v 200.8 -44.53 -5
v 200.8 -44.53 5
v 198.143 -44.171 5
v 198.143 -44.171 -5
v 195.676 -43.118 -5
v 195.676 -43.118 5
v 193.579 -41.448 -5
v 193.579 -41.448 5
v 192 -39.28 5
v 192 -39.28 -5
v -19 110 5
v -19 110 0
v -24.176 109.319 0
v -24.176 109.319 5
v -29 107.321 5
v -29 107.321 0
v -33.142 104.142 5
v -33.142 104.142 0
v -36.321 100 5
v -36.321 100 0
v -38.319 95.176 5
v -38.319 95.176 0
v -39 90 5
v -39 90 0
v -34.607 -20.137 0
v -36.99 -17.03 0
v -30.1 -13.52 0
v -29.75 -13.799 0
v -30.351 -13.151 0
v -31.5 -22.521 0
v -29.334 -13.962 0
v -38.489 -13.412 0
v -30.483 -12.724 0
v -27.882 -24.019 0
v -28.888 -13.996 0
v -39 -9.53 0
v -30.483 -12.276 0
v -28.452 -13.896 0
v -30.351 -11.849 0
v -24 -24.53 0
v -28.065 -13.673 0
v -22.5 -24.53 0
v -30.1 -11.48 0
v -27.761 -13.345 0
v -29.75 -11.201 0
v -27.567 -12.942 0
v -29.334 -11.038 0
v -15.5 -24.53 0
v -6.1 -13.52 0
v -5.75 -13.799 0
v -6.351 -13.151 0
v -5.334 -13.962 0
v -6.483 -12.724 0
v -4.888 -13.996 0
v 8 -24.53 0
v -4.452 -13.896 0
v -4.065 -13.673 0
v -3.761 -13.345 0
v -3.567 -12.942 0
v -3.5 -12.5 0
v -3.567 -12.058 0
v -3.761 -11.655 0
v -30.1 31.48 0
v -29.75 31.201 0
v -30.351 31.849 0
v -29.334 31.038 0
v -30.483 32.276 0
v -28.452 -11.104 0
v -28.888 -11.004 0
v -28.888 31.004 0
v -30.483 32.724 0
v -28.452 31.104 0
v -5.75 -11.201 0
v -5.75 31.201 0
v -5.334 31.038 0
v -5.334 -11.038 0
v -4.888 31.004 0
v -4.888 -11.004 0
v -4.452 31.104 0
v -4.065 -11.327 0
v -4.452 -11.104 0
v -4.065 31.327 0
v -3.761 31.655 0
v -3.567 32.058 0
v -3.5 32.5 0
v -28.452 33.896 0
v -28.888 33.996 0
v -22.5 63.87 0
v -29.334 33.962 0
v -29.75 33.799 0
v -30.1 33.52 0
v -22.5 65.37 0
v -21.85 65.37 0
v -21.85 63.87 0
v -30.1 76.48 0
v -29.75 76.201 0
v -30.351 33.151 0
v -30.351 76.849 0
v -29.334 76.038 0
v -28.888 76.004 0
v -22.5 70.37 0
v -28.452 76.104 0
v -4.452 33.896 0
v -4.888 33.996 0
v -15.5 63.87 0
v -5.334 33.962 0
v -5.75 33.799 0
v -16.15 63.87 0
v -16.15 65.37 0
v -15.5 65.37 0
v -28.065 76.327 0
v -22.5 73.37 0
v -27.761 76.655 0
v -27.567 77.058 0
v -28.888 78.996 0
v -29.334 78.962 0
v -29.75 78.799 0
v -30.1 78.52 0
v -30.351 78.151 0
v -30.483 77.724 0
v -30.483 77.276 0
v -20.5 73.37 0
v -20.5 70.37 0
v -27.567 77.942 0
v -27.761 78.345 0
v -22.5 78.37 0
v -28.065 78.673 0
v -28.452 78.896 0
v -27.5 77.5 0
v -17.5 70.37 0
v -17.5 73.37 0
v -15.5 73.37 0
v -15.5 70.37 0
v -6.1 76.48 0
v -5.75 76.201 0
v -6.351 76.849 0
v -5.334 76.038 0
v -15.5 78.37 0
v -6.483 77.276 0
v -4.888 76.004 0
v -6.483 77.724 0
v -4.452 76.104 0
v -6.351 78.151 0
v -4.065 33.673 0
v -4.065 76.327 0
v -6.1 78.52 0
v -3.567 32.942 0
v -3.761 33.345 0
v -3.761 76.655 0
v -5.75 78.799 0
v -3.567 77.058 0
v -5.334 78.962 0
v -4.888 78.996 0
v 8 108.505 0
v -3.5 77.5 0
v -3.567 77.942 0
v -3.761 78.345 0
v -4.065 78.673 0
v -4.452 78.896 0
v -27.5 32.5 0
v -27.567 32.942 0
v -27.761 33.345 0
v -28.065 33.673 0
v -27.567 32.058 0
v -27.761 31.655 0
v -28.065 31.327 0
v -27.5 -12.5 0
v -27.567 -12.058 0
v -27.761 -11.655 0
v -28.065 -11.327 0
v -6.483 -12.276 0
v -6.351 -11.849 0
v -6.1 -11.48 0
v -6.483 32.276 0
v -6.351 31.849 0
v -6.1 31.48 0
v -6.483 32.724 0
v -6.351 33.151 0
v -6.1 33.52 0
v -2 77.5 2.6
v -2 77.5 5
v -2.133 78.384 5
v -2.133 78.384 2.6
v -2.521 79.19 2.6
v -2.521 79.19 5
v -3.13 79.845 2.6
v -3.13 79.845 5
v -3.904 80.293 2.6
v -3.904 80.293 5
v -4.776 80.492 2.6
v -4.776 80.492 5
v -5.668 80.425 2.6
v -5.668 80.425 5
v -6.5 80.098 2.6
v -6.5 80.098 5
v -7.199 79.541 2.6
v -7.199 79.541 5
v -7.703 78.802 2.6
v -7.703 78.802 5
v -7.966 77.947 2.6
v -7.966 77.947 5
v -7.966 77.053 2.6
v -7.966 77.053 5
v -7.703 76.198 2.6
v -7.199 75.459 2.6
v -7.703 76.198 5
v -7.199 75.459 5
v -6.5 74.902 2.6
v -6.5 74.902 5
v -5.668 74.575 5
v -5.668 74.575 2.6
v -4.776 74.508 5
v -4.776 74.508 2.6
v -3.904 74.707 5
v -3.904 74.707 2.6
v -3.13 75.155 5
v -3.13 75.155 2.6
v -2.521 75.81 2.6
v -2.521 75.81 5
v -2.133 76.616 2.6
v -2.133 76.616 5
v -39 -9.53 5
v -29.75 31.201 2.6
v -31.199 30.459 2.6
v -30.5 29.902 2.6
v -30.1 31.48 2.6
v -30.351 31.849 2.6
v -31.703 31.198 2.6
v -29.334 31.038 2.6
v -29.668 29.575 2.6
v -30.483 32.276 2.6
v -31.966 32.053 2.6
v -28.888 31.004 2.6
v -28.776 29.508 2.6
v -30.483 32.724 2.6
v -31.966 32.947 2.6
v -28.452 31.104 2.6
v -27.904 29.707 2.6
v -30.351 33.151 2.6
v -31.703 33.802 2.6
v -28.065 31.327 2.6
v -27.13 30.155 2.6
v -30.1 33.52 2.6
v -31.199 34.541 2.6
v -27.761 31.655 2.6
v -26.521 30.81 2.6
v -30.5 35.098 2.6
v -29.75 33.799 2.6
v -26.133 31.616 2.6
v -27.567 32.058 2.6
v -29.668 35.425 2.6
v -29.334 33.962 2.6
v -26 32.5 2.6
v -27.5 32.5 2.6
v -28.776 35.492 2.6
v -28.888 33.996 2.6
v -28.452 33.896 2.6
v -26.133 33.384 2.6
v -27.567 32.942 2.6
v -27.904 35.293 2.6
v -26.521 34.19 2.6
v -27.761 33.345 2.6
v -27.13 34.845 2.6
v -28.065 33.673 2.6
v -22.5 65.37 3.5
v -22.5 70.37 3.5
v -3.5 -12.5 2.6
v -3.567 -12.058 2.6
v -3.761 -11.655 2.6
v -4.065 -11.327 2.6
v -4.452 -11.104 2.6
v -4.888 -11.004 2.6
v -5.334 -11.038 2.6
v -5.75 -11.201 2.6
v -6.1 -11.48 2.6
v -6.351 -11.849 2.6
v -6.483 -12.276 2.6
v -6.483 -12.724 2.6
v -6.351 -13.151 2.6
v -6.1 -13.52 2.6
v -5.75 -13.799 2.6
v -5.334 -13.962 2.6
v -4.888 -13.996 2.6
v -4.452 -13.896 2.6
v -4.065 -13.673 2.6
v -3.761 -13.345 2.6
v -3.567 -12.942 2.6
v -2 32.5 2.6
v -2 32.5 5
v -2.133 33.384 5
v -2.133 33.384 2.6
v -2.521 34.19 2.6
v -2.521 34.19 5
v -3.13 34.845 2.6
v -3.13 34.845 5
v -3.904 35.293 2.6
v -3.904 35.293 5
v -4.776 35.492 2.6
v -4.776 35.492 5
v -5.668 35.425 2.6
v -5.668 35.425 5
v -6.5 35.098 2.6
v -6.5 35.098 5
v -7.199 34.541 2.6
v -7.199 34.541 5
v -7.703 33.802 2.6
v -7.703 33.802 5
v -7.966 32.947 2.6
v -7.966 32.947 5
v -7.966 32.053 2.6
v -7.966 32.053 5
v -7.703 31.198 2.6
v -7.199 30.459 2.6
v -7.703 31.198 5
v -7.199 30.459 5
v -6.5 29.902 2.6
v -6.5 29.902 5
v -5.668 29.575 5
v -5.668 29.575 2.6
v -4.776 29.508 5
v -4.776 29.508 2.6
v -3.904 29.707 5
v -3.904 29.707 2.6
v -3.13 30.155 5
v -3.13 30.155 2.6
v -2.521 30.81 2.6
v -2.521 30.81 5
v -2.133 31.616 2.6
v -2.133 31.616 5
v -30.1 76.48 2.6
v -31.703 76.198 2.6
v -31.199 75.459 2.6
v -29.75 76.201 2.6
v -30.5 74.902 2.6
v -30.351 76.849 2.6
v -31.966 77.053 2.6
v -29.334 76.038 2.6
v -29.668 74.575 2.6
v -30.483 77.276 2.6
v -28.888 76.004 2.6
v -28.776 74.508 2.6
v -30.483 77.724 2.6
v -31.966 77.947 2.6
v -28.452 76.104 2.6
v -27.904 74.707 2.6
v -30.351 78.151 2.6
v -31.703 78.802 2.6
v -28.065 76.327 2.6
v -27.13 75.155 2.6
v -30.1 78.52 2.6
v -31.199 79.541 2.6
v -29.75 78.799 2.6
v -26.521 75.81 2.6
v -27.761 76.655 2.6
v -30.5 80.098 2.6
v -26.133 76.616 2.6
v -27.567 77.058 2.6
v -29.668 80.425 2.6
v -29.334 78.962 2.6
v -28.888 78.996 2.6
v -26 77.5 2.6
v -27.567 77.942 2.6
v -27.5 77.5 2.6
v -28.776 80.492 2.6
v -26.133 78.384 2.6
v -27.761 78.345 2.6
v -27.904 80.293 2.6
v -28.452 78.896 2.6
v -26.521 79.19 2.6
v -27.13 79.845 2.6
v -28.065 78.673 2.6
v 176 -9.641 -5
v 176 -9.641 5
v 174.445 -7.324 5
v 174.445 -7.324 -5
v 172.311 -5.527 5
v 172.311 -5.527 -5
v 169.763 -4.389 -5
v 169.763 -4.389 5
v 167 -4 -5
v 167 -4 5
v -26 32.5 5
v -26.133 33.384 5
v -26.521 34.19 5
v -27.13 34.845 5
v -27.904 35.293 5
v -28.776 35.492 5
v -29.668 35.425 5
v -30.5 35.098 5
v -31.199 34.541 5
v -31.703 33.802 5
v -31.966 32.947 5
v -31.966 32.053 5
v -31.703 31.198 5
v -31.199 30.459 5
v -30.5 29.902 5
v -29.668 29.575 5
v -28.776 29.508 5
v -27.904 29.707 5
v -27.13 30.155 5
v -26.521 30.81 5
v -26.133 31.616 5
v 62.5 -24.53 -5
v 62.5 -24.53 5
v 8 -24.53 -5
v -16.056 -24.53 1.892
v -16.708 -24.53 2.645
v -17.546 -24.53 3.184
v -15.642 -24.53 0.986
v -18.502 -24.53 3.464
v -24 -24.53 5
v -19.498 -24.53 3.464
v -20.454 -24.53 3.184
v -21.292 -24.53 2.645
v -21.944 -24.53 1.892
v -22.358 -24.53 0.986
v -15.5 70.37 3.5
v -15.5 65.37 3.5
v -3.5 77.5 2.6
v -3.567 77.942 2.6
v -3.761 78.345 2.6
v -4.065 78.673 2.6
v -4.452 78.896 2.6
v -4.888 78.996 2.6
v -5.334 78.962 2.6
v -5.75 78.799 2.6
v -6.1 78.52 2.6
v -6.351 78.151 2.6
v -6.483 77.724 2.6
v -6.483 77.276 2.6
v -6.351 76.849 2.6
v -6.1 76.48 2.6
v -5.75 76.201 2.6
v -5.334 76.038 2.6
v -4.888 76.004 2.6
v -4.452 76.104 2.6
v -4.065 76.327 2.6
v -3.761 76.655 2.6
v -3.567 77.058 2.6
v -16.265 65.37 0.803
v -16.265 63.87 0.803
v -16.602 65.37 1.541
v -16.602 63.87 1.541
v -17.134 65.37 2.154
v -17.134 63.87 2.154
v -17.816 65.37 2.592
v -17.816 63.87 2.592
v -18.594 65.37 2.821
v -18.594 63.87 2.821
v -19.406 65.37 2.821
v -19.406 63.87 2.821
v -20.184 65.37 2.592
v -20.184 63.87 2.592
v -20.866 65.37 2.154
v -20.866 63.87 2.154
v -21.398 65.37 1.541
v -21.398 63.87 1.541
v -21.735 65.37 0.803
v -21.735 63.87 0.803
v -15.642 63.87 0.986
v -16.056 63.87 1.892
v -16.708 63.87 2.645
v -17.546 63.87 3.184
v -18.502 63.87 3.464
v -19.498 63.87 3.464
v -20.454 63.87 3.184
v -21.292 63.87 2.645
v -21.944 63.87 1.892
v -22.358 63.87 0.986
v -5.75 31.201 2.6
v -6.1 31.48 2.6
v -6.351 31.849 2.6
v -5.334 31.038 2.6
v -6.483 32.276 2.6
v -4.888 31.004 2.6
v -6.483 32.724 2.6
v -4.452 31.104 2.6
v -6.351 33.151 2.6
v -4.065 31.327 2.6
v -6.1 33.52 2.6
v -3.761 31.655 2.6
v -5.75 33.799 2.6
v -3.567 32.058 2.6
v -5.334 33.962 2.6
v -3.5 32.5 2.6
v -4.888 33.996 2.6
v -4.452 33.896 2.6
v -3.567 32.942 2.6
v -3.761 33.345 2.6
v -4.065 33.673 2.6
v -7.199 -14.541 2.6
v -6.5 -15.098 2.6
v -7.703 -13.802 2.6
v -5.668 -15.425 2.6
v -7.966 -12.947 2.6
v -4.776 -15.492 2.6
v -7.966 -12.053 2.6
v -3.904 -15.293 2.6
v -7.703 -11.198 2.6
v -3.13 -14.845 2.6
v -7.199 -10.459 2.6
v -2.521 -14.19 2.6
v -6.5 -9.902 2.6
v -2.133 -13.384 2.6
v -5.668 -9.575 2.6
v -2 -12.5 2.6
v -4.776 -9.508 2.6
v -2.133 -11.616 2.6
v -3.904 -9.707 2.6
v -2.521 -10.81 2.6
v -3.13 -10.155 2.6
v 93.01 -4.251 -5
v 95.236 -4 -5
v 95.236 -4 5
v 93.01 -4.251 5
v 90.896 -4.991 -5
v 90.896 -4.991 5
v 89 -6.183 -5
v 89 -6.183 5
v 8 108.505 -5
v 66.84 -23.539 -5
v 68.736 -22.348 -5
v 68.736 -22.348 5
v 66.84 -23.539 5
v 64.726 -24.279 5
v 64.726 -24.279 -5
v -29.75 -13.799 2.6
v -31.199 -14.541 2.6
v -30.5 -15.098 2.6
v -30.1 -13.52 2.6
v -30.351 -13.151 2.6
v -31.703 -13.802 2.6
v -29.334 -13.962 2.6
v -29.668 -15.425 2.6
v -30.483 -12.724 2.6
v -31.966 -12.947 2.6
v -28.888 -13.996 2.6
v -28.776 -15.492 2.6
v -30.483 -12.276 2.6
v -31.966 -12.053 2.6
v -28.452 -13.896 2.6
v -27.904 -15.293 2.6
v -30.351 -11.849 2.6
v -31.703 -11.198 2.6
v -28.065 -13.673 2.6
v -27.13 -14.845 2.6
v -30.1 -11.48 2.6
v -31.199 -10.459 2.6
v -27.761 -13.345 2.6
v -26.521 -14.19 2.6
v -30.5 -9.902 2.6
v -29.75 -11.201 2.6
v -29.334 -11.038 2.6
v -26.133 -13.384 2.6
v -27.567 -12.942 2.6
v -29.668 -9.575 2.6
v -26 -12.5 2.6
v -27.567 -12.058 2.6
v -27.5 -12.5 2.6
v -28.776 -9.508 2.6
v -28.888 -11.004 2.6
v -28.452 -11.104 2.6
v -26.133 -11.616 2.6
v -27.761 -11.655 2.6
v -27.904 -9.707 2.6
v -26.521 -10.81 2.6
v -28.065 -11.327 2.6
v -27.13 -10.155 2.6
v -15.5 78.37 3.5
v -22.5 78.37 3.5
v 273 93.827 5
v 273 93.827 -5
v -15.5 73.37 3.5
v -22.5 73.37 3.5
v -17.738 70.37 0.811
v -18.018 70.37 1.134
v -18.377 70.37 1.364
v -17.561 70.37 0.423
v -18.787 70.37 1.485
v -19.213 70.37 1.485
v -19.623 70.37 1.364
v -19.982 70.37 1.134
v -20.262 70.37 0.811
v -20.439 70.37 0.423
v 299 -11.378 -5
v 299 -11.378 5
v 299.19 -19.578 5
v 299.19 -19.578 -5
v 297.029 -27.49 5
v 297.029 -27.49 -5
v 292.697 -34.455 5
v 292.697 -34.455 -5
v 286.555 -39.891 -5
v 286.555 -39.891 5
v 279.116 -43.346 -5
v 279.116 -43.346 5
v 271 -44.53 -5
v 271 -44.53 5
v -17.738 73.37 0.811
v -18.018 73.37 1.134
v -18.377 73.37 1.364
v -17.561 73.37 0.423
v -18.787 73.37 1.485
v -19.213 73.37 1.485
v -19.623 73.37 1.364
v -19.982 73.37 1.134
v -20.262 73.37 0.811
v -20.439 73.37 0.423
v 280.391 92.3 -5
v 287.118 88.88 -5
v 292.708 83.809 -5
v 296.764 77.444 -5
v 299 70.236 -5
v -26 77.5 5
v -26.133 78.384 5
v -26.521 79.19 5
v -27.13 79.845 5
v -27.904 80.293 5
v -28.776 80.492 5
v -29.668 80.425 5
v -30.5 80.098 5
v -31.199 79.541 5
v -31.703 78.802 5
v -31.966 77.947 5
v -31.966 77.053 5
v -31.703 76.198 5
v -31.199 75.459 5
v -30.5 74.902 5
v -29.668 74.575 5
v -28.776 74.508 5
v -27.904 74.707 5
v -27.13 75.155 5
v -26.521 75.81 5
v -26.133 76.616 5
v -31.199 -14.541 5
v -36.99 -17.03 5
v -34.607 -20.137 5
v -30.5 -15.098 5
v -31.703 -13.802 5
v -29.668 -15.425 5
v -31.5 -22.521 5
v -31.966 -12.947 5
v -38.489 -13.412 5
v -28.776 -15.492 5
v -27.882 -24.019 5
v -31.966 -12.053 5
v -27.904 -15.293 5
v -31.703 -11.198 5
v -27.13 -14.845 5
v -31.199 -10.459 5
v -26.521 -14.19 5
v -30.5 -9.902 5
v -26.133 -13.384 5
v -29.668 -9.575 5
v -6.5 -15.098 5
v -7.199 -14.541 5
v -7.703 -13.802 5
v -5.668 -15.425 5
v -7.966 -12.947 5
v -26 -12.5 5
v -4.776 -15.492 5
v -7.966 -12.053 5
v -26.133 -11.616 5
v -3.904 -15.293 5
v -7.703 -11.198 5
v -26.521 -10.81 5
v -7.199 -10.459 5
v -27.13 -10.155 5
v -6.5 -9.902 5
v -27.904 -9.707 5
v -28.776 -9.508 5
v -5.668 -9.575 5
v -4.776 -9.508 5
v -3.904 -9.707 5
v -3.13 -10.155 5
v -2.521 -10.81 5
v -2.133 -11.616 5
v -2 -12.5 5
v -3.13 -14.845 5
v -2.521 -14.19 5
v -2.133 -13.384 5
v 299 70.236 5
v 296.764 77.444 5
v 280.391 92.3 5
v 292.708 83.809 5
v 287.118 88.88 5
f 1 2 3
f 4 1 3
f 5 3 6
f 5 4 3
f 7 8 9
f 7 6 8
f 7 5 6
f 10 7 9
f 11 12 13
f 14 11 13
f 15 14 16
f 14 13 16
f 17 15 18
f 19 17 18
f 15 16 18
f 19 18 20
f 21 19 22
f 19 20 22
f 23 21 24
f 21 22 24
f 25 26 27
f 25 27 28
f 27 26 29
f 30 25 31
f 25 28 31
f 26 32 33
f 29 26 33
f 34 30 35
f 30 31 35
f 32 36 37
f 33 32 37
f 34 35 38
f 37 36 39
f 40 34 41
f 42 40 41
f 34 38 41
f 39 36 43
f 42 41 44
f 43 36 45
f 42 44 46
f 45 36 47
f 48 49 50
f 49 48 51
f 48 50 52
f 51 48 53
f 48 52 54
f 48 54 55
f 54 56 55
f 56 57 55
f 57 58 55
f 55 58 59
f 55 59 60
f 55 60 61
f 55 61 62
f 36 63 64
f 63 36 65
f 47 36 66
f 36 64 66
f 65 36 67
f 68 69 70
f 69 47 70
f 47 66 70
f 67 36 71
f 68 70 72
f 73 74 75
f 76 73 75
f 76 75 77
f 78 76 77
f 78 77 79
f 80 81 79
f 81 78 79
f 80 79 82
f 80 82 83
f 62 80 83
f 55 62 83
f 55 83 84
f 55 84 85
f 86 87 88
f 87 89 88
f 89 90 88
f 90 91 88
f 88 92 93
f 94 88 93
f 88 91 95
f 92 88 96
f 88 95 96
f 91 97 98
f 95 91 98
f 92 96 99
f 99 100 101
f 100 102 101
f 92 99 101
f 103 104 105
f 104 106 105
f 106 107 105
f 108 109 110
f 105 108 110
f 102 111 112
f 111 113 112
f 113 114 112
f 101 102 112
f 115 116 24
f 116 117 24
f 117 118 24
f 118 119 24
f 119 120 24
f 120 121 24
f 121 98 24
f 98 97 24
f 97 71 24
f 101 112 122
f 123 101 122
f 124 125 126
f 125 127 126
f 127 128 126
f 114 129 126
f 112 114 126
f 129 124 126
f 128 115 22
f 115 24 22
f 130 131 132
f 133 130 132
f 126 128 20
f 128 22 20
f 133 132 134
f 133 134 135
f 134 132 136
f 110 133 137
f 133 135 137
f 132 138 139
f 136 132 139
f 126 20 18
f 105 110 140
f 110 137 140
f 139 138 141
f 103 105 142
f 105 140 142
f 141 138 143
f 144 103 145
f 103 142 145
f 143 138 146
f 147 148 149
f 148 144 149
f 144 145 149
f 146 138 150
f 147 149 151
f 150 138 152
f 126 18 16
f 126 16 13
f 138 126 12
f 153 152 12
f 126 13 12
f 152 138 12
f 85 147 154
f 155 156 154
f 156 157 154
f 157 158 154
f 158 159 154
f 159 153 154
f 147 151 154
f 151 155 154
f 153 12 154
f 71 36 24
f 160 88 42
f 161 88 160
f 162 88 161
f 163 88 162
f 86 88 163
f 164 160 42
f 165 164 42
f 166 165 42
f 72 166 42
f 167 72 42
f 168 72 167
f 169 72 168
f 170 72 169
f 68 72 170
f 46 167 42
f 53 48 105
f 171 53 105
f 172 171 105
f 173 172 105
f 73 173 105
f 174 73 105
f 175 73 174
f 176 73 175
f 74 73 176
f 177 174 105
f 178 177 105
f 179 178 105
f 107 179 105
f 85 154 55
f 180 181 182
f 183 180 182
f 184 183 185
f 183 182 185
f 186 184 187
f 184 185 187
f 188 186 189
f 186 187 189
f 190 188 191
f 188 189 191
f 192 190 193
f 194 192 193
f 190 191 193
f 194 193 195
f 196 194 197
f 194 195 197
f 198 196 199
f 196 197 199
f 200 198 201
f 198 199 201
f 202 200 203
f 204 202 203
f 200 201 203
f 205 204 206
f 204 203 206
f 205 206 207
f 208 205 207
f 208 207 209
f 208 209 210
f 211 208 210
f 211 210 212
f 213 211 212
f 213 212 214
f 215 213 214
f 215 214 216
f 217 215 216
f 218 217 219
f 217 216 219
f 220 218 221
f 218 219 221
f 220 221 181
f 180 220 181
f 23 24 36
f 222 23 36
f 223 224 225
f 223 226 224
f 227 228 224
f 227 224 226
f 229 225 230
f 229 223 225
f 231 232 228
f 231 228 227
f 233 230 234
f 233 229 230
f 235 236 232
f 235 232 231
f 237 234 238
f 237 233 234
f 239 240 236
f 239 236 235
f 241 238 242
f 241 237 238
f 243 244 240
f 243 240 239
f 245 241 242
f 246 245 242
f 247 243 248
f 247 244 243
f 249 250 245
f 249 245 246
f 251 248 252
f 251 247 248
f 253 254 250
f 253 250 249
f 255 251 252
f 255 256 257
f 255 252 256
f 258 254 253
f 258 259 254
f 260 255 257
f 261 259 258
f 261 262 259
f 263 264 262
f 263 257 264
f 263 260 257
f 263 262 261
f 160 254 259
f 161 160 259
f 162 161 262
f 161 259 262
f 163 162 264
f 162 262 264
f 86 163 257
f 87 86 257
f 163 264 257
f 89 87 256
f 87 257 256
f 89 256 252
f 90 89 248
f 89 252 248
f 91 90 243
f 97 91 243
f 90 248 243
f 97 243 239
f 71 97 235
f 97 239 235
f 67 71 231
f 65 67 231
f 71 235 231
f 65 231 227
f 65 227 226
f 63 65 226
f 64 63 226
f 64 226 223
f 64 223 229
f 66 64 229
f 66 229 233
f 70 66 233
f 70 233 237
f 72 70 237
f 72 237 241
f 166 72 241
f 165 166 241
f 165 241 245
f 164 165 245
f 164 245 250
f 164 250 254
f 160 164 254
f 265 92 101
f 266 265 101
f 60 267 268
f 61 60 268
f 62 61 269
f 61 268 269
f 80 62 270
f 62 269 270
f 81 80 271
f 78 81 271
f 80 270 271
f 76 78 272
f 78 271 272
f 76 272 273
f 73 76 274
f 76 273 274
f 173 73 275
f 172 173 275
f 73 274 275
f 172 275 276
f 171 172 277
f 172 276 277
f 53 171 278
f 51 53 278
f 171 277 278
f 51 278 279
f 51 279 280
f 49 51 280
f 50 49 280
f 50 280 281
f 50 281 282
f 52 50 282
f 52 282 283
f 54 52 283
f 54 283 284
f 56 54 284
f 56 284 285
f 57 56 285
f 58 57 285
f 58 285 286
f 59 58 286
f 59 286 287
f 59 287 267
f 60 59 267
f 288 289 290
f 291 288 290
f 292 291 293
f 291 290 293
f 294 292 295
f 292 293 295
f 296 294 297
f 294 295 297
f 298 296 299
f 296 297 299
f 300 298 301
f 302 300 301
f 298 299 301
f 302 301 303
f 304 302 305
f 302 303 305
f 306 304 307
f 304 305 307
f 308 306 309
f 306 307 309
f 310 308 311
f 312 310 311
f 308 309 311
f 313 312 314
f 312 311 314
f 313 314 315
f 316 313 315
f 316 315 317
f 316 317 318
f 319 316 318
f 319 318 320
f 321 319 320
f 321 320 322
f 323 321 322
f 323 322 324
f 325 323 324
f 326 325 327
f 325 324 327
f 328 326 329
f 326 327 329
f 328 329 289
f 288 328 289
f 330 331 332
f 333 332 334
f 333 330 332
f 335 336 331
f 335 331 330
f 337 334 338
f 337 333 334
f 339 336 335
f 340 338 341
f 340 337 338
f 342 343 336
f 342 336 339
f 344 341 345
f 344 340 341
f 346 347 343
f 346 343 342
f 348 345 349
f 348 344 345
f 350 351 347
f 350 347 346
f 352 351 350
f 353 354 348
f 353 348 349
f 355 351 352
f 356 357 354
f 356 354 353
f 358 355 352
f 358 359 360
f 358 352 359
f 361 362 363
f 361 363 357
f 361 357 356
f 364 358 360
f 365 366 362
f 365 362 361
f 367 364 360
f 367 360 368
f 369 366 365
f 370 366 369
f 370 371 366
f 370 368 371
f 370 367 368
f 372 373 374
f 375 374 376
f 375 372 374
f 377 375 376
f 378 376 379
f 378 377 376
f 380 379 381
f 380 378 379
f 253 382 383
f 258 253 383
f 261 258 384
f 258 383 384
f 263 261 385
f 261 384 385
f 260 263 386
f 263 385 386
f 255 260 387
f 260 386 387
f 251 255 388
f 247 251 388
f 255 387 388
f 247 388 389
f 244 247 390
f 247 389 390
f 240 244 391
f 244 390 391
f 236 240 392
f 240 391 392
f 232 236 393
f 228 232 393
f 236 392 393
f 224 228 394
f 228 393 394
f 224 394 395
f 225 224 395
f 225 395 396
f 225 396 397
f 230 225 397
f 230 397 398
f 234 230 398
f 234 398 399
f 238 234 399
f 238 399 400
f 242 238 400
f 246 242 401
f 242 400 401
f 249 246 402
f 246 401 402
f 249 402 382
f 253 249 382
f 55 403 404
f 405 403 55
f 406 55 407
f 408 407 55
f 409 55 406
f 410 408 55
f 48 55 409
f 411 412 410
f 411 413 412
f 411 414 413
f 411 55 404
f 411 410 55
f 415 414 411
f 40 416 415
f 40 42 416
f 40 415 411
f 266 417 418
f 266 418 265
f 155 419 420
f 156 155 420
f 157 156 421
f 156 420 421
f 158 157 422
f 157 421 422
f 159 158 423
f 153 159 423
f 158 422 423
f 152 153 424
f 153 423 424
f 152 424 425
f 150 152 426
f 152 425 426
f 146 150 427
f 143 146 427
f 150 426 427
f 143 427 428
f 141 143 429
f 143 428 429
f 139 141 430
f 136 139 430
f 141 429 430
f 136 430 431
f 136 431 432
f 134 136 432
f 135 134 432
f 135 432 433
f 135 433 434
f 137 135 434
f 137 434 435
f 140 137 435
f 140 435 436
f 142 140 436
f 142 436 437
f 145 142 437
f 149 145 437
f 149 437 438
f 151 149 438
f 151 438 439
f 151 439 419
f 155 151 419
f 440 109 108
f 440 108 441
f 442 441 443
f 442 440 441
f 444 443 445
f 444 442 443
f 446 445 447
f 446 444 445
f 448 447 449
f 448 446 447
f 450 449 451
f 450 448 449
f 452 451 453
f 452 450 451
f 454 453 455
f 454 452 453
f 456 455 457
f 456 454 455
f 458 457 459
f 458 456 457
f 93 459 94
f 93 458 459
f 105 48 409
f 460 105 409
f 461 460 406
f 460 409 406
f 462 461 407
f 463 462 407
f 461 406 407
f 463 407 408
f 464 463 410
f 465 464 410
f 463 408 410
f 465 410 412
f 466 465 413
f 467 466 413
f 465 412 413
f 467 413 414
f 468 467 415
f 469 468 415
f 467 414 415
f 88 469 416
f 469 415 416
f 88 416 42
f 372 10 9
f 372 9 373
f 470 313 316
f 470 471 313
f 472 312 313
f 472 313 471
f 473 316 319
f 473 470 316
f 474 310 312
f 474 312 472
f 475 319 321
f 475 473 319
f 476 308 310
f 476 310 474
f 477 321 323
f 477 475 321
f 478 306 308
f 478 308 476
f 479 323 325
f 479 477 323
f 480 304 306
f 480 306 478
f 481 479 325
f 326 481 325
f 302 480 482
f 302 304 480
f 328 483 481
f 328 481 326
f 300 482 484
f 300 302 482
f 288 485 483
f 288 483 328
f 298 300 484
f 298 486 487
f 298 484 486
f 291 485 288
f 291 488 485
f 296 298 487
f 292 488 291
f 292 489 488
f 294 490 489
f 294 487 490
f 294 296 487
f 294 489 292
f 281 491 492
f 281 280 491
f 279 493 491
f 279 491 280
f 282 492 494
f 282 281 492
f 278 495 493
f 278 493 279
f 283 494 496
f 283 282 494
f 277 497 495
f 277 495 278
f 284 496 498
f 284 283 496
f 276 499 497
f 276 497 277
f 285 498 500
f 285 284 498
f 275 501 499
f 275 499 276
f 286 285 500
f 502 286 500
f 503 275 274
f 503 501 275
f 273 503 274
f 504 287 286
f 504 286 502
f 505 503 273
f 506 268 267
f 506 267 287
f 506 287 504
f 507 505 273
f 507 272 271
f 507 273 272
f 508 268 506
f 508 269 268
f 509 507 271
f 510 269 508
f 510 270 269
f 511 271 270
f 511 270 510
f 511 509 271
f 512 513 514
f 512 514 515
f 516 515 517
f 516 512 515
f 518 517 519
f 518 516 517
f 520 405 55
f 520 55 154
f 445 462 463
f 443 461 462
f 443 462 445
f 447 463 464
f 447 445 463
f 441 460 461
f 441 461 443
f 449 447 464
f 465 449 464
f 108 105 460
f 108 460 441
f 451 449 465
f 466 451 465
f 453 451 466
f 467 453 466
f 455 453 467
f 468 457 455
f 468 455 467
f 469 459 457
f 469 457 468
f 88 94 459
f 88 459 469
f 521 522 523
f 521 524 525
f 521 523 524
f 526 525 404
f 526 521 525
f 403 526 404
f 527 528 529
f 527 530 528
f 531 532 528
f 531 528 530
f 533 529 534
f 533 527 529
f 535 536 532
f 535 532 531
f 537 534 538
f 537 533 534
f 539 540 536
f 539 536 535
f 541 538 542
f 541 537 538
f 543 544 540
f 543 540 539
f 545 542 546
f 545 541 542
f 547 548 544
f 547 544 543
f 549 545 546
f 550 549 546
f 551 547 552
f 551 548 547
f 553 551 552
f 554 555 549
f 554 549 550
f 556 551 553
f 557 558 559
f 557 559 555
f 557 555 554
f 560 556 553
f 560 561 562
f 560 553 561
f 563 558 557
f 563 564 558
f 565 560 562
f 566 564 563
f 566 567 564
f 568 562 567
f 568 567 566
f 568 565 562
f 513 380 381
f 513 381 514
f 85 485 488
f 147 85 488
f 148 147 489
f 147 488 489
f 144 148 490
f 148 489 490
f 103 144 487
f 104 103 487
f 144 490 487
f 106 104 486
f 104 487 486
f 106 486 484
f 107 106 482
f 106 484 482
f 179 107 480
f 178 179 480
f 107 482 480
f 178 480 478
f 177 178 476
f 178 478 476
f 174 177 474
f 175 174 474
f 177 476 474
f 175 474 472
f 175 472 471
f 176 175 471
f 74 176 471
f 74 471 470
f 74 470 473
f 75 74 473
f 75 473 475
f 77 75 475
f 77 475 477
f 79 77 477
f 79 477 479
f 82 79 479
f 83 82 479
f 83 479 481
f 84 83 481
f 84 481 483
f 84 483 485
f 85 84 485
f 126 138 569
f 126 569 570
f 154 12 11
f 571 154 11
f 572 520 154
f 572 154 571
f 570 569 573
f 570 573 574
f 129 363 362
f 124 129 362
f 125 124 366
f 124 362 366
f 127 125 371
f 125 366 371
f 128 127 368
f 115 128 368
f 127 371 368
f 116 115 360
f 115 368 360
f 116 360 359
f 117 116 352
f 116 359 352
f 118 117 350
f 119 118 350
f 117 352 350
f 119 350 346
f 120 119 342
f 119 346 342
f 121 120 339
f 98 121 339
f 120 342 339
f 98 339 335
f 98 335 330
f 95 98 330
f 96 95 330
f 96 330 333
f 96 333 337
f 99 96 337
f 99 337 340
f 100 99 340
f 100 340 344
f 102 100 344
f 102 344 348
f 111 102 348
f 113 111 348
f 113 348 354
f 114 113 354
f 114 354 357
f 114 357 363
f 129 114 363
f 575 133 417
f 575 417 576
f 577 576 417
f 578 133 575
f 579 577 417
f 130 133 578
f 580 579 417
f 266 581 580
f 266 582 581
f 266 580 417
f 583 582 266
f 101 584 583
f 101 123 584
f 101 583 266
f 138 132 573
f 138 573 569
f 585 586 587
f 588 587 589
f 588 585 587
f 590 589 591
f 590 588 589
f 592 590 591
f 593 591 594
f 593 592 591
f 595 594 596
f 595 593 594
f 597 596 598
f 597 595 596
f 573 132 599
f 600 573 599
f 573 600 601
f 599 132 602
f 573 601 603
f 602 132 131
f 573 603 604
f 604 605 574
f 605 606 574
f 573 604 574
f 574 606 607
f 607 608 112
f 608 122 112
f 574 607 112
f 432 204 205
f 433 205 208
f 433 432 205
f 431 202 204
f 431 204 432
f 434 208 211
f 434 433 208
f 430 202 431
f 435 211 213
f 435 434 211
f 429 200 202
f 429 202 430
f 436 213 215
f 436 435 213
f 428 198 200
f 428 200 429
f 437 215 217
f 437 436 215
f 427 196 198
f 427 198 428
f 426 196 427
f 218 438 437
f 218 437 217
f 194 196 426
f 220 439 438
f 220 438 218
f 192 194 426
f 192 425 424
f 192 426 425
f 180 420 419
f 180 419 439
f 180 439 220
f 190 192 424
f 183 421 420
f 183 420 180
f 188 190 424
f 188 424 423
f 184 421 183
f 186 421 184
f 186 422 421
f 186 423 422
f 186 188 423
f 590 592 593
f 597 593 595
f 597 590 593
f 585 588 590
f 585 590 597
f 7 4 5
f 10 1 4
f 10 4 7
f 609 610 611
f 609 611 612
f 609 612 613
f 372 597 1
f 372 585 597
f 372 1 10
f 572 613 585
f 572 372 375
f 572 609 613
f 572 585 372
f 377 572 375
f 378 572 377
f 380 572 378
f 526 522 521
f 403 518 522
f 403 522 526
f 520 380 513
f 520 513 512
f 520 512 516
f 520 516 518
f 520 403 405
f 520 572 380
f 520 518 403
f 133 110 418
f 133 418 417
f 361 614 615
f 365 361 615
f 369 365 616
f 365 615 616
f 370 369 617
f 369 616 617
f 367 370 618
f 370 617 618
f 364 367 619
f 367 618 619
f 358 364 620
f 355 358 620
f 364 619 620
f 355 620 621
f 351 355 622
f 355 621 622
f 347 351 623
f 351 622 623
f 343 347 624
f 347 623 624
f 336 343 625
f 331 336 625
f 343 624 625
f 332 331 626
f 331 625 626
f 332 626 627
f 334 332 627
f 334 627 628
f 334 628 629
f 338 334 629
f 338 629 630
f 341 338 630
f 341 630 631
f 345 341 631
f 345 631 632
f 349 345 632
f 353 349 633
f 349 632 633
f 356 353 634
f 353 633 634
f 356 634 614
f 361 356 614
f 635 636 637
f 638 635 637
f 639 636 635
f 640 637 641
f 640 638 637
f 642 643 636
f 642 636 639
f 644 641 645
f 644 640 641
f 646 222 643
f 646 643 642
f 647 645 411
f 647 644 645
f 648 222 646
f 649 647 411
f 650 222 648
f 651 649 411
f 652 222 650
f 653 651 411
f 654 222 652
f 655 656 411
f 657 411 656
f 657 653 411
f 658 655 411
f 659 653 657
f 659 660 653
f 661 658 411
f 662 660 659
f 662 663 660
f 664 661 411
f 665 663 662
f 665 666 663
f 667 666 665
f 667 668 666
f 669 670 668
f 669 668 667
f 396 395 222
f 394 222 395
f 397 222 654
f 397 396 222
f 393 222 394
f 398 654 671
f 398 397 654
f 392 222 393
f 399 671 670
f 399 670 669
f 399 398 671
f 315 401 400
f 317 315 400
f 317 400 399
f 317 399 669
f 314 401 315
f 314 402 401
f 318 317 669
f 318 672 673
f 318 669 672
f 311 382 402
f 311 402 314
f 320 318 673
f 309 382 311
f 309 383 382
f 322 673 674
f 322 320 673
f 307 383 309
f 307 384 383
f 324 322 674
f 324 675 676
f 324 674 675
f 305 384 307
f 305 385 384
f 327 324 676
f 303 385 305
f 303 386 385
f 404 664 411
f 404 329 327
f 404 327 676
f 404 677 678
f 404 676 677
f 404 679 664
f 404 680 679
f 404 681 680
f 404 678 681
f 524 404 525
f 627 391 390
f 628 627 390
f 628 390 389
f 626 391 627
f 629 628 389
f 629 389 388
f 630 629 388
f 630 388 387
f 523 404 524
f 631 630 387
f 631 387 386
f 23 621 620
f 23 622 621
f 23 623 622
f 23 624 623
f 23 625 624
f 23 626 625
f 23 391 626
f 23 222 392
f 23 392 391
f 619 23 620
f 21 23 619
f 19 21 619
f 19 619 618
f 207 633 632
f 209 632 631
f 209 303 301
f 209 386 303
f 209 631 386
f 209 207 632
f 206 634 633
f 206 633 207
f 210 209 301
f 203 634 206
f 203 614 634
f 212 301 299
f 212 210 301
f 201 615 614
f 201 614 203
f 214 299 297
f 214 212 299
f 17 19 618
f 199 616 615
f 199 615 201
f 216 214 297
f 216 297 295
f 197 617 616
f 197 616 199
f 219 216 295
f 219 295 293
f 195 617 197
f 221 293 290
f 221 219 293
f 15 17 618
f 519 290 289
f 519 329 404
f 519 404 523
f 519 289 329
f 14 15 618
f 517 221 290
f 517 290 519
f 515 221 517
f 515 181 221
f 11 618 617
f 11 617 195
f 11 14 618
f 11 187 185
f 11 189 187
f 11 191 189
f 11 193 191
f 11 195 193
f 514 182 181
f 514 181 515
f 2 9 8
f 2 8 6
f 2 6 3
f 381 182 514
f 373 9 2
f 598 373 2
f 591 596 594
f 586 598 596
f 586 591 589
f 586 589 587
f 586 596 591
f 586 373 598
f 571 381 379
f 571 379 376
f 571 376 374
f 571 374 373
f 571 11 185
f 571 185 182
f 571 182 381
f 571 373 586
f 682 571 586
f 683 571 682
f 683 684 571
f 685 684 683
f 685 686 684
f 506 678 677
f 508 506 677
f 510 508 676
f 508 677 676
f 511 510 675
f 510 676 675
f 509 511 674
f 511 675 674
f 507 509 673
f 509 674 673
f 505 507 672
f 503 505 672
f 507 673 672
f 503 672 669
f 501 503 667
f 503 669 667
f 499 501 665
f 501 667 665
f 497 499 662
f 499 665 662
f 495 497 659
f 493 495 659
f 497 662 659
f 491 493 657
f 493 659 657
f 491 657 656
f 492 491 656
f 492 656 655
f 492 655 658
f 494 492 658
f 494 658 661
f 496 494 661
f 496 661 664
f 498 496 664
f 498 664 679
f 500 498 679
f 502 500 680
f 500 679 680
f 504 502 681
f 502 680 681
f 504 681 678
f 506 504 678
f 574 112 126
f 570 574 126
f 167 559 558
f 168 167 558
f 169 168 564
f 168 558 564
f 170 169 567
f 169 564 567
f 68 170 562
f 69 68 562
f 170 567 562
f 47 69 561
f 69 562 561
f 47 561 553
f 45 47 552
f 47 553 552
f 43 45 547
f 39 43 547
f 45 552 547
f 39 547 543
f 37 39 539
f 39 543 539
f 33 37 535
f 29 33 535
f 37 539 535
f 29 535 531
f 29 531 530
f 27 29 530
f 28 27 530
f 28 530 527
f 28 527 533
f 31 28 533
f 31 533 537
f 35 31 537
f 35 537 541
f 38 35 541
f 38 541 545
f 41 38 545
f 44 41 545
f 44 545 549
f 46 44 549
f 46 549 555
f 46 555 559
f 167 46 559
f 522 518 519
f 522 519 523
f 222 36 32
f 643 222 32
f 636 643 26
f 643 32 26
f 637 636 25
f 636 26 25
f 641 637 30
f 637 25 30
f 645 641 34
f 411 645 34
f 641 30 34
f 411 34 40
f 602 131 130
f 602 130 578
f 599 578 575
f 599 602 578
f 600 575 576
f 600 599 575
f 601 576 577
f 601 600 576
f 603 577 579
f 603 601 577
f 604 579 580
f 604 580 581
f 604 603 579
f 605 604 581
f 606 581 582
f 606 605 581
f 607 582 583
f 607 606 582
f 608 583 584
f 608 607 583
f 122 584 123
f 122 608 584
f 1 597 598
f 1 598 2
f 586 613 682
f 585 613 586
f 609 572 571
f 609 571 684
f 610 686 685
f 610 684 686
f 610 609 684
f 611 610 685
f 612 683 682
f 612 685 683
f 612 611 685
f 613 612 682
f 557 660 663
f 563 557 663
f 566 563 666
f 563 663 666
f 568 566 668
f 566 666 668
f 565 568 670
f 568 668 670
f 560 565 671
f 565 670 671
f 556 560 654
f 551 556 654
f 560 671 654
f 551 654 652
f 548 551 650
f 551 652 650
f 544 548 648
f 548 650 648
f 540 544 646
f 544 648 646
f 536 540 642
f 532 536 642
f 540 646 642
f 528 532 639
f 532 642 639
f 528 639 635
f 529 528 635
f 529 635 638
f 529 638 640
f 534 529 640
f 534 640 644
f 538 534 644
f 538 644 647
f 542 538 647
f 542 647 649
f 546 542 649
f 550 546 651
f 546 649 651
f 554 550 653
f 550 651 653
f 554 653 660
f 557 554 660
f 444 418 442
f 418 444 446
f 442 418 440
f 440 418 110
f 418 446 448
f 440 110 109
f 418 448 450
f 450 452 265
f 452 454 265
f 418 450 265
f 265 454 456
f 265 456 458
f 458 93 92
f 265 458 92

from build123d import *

# Parameters (mm, degrees)
DODANIE_WYCI_GNI_CIE1_DEPTH = 5
SZKIC1_R                    = 3.5
WYTNIJ_WYCI_GNI_CIE1_DEPTH  = 88.4
SZKIC3_R                    = 1.5
WYTNIJ_WYCI_GNI_CIE3_DEPTH  = 5
SZKIC5_R                    = 3
WYTNIJ_WYCI_GNI_CIE4_DEPTH  = 2.4
DODANIE_WYCI_GNI_CIE2_START = 5
DODANIE_WYCI_GNI_CIE2_DEPTH = 5
SZKIC7_R                    = 3.5
WYTNIJ_WYCI_GNI_CIE5_DEPTH  = 5
SZKIC8_R                    = 3.5
WYTNIJ_WYCI_GNI_CIE6_DEPTH  = 5
SZKIC9_R                    = 1.5
WYTNIJ_WYCI_GNI_CIE7_DEPTH  = 3
SZKIC10_R                   = 2.85
WYTNIJ_WYCI_GNI_CIE8_DEPTH  = 2
SZKIC11_W                   = 7
SZKIC11_H                   = 5
WYTNIJ_WYCI_GNI_CIE9_DEPTH  = 3.5


with BuildPart() as part:
    # outer-wire → Dodanie-wyciągnięcie1 (new body)
    with BuildSketch(Plane.XY):
        with BuildLine():
            Line((-24, -24.53020641), (62.5, -24.53020641))
            ThreePointArc((62.5, -24.53020641), (65.803504247, -23.968789974), (68.736080178, -22.347578348))
            Line((68.736080178, -22.347578348), (89, -6.182628062))
            ThreePointArc((89, -6.182628062), (91.932575931, -4.561416436), (95.236080178, -4))
            Line((95.236080178, -4), (167, -4))
            ThreePointArc((167, -4), (172.310885546, -5.526836794), (176, -9.641101056))
            Line((176, -9.641101056), (192, -39.280484771))
            ThreePointArc((192, -39.280484771), (195.676368139, -43.118069462), (200.799707694, -44.53020641))
            Line((200.799707694, -44.53020641), (271, -44.53020641))
            ThreePointArc((271, -44.53020641), (292.697243682, -34.454979346), (299, -11.3778078))
            Line((299, -11.3778078), (299, 70.236479581))
            ThreePointArc((299, 70.236479581), (290.082226047, 86.530998263), (273, 93.827270232))
            Line((273, 93.827270232), (-19, 110))
            ThreePointArc((-19, 110), (-33.142135624, 104.142135624), (-39, 90))
            Line((-39, 90), (-39, -9.53020641))
            ThreePointArc((-39, -9.53020641), (-34.606601718, -20.136808128), (-24, -24.53020641))
        make_face()
    extrude(amount=DODANIE_WYCI_GNI_CIE1_DEPTH)

    # Szkic1 → Wytnij-wyciągnięcie1 (cut)
    with BuildSketch(Plane(origin=(0, -24.53020641, 0), x_dir=(-1, 0, 0), z_dir=(0, -1, 0))):
        with Locations((19, 0)):
            Circle(SZKIC1_R)
    extrude(amount=-WYTNIJ_WYCI_GNI_CIE1_DEPTH, mode=Mode.SUBTRACT)

    # Szkic3 → Wytnij-wyciągnięcie3 (cut)
    with BuildSketch(Plane.XY.offset(5)):
        with Locations((-5, 77.5)):
            Circle(SZKIC3_R)
        with Locations((-29, 77.5)):
            Circle(SZKIC3_R)
        with Locations((-29, -12.5)):
            Circle(SZKIC3_R)
        with Locations((-29, 32.5)):
            Circle(SZKIC3_R)
        with Locations((-5, 32.5)):
            Circle(SZKIC3_R)
        with Locations((-5, -12.5)):
            Circle(SZKIC3_R)
    extrude(amount=-WYTNIJ_WYCI_GNI_CIE3_DEPTH, mode=Mode.SUBTRACT)

    # Szkic5 → Wytnij-wyciągnięcie4 (cut)
    with BuildSketch(Plane.XY.offset(5)):
        with Locations((-29, -12.5)):
            Circle(SZKIC5_R)
        with Locations((-29, 32.5)):
            Circle(SZKIC5_R)
        with Locations((-29, 77.5)):
            Circle(SZKIC5_R)
        with Locations((-5, 77.5)):
            Circle(SZKIC5_R)
        with Locations((-5, 32.5)):
            Circle(SZKIC5_R)
        with Locations((-5, -12.5)):
            Circle(SZKIC5_R)
    extrude(amount=-WYTNIJ_WYCI_GNI_CIE4_DEPTH, mode=Mode.SUBTRACT)

    # Szkic6 → Dodanie-wyciągnięcie2 (add)
    with BuildSketch(Plane(origin=(0, 0, 0), x_dir=(-1, 0, 0), z_dir=(0, 0, -1)).offset(DODANIE_WYCI_GNI_CIE2_START)):
        with BuildLine():
            Line((-8, -24.53020641), (-8, 108.504576357))
            Line((-8, 108.504576357), (-273, 93.827270232))
            ThreePointArc((-273, 93.827270232), (-290.082226047, 86.530998263), (-299, 70.236479581))
            Line((-299, 70.236479581), (-299, -11.3778078))
            ThreePointArc((-299, -11.3778078), (-292.697243682, -34.454979346), (-271, -44.53020641))
            Line((-271, -44.53020641), (-200.799707694, -44.53020641))
            ThreePointArc((-200.799707694, -44.53020641), (-195.676368139, -43.118069462), (-192, -39.280484771))
            Line((-192, -39.280484771), (-176, -9.641101056))
            ThreePointArc((-176, -9.641101056), (-172.310885546, -5.526836794), (-167, -4))
            Line((-167, -4), (-95.236080178, -4))
            ThreePointArc((-95.236080178, -4), (-91.932575931, -4.561416436), (-89, -6.182628062))
            Line((-89, -6.182628062), (-68.736080178, -22.347578348))
            ThreePointArc((-68.736080178, -22.347578348), (-65.803504247, -23.968789974), (-62.5, -24.53020641))
            Line((-62.5, -24.53020641), (-8, -24.53020641))
        make_face()
    extrude(amount=-DODANIE_WYCI_GNI_CIE2_DEPTH)

    # Szkic7 → Wytnij-wyciągnięcie5 (cut)
    with BuildSketch(Plane(origin=(0, 65.36979359, 0), x_dir=(-1, 0, 0), z_dir=(0, -1, 0))):
        with Locations((19, 0)):
            Circle(SZKIC7_R)
    extrude(amount=-WYTNIJ_WYCI_GNI_CIE5_DEPTH, mode=Mode.SUBTRACT)

    # Szkic8 → Wytnij-wyciągnięcie6 (cut)
    with BuildSketch(Plane(origin=(0, 73.36979359, 0), x_dir=(-1, 0, 0), z_dir=(0, -1, 0))):
        with Locations((19, 0)):
            Circle(SZKIC8_R)
    extrude(amount=-WYTNIJ_WYCI_GNI_CIE6_DEPTH, mode=Mode.SUBTRACT)

    # Szkic9 → Wytnij-wyciągnięcie7 (cut)
    with BuildSketch(Plane(origin=(0, 73.36979359, 0), x_dir=(-1, 0, 0), z_dir=(0, -1, 0))):
        with Locations((19, 0)):
            Circle(SZKIC9_R)
    extrude(amount=WYTNIJ_WYCI_GNI_CIE7_DEPTH, mode=Mode.SUBTRACT)

    # Szkic10 → Wytnij-wyciągnięcie8 (cut)
    with BuildSketch(Plane(origin=(0, 65.36979359, 0), x_dir=(-1, 0, 0), z_dir=(0, -1, 0))):
        with Locations((19, 0)):
            Circle(SZKIC10_R)
    extrude(amount=WYTNIJ_WYCI_GNI_CIE8_DEPTH, mode=Mode.SUBTRACT)

    # Szkic11 → Wytnij-wyciągnięcie9 (cut)
    with BuildSketch(Plane(origin=(0, 0, 0), x_dir=(-1, 0, 0), z_dir=(0, 0, -1))):
        with Locations((19, 75.86979359)):
            Rectangle(SZKIC11_W, SZKIC11_H)
        with Locations((19, 67.86979359)):
            Rectangle(SZKIC11_W, SZKIC11_H)
    extrude(amount=-WYTNIJ_WYCI_GNI_CIE9_DEPTH, mode=Mode.SUBTRACT)


solid = part.part
